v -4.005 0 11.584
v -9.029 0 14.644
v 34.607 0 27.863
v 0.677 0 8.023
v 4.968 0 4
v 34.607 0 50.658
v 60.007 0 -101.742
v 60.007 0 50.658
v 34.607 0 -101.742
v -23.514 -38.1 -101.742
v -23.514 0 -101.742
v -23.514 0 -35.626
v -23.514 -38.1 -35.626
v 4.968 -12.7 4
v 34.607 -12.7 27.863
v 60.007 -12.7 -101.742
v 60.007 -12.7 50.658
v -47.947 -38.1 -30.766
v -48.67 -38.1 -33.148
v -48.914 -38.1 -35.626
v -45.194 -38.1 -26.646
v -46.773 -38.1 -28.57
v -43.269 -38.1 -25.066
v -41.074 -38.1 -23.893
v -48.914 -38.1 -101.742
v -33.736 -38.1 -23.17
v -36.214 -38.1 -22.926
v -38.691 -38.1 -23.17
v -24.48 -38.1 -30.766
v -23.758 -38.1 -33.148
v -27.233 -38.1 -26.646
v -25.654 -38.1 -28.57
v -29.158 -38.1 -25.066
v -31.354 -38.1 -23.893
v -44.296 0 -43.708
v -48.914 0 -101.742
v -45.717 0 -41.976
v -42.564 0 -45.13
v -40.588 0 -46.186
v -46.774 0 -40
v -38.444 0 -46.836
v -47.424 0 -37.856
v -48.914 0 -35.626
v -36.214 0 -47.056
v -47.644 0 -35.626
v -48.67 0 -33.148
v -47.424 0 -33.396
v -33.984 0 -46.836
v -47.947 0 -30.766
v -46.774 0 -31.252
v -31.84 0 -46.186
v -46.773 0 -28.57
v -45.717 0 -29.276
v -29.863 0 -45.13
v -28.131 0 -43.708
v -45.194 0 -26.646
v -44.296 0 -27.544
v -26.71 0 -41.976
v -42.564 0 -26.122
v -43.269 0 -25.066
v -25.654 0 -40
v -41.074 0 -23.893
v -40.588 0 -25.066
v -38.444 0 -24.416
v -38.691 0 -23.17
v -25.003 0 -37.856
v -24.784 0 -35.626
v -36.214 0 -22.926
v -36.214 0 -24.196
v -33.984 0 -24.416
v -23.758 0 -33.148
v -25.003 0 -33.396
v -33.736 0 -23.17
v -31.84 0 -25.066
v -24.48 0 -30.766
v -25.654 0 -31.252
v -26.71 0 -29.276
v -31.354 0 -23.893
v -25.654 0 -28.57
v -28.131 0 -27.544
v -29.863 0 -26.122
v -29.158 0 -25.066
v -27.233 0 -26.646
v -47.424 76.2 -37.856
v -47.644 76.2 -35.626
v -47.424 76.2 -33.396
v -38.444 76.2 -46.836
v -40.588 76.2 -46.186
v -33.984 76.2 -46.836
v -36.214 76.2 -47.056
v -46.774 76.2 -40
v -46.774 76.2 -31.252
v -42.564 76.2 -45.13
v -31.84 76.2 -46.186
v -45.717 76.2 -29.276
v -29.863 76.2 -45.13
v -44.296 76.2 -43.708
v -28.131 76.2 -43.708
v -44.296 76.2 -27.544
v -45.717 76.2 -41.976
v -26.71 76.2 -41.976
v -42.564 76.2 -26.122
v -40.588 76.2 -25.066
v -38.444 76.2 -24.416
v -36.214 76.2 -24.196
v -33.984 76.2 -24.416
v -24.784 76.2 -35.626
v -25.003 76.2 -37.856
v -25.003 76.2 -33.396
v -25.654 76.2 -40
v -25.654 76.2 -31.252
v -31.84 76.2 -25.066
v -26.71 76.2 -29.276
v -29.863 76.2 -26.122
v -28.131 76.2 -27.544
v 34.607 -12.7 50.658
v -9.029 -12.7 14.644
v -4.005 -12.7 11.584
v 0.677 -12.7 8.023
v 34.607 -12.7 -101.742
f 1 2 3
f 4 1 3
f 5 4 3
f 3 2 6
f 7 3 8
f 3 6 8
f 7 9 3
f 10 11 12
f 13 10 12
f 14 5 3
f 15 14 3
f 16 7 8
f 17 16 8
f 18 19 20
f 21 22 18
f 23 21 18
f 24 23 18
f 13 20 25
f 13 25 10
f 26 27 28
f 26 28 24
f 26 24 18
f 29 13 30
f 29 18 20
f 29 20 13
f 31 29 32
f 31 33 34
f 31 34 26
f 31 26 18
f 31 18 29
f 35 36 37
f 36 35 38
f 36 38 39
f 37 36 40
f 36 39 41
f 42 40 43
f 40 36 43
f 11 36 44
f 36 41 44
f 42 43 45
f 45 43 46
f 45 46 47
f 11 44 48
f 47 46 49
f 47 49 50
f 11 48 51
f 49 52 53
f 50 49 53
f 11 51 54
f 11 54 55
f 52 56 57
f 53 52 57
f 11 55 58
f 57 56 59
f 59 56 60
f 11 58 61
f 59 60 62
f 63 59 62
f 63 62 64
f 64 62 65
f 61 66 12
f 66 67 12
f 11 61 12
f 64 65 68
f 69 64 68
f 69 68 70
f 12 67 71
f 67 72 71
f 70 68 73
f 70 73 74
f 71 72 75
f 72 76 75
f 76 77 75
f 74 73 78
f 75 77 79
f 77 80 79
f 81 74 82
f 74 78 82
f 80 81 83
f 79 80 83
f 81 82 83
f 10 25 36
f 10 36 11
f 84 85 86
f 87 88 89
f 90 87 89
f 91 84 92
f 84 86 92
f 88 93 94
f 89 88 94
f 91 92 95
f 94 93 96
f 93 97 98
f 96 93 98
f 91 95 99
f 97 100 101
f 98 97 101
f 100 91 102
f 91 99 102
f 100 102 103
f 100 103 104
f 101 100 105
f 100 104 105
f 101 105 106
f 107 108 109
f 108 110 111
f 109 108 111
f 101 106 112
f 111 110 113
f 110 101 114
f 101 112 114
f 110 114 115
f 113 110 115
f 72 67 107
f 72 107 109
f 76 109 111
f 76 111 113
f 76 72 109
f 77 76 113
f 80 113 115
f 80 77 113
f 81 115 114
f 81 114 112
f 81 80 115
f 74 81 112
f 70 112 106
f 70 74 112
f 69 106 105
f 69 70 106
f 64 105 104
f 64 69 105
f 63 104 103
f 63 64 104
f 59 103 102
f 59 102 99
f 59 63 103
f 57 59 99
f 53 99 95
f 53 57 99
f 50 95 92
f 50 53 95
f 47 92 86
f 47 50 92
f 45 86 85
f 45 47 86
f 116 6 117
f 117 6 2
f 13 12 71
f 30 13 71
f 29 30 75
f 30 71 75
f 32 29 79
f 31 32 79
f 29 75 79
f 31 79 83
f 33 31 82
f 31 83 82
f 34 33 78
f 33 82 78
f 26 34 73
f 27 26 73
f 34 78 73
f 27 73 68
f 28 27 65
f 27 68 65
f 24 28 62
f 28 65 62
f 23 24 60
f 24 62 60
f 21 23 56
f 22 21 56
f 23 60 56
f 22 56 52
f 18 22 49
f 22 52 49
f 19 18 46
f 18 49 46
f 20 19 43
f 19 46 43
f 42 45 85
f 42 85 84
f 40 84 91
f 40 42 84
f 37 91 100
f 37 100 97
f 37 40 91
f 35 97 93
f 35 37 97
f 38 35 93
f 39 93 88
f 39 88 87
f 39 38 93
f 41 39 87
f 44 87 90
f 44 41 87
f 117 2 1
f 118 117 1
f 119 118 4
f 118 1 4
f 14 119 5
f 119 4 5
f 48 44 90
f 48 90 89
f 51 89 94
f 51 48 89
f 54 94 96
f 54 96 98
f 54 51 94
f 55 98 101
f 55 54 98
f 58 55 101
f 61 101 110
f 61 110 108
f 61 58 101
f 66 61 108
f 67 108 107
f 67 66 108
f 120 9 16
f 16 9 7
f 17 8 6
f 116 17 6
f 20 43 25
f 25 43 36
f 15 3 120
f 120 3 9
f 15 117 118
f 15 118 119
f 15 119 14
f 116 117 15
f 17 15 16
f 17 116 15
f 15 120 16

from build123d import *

# Parameters (mm, degrees)
F1_DEPTH      = 12.7
F1_FACE_R     = 11.43
F2_DEPTH      = 25.4
F3_DEPTH      = 38.1
F3_DEPTH_BACK = 76.2


with BuildPart() as f1:
    # F0 (on Front) → F1 (new body)
    with BuildSketch(Plane.XZ):
        with BuildLine():
            Line((-36.2136464912, -101.742199043), (-23.5136464912, -101.742199043))
            Line((-23.5136464912, -101.742199043), (-23.5136464912, -84.8128875398))
            ThreePointArc((-23.5136464912, -84.8128875398), (-29.8126284331, -86.0211076134), (-36.2136464912, -86.425999043))
            Line((-36.2136464912, -86.425999043), (-36.2136464912, -101.742199043))
        make_face()
        with BuildLine():
            Line((-48.9136464912, -101.742199043), (-36.2136464912, -101.742199043))
            Line((-36.2136464912, -101.742199043), (-36.2136464912, -86.425999043))
            ThreePointArc((-36.2136464912, -86.425999043), (-42.6146645493, -86.0211076134), (-48.9136464912, -84.8128875398))
            Line((-48.9136464912, -84.8128875398), (-48.9136464912, -101.742199043))
        make_face()
        with BuildLine():
            ThreePointArc((-36.2136464912, -86.425999043), (-29.8126284331, -86.0211076134), (-23.5136464912, -84.8128875398))
            Line((-23.5136464912, -84.8128875398), (-23.5136464912, -35.625999043))
            ThreePointArc((-23.5136464912, -35.625999043), (-27.2333903701, -44.606255164), (-36.2136464912, -48.325999043))
            Line((-36.2136464912, -48.325999043), (-36.2136464912, -86.425999043))
        make_face()
        with BuildLine():
            ThreePointArc((-48.9136464912, -84.8128875398), (-42.6146645493, -86.0211076134), (-36.2136464912, -86.425999043))
            Line((-36.2136464912, -86.425999043), (-36.2136464912, -48.325999043))
            ThreePointArc((-36.2136464912, -48.325999043), (-45.1939026123, -44.606255164), (-48.9136464912, -35.625999043))
            Line((-48.9136464912, -35.625999043), (-48.9136464912, -84.8128875398))
        make_face()
        with BuildLine():
            Line((-24.7836464912, -35.625999043), (-23.5136464912, -35.625999043))
            ThreePointArc((-23.5136464912, -35.625999043), (-36.2136464912, -22.925999043), (-48.9136464912, -35.625999043))
            Line((-48.9136464912, -35.625999043), (-47.6436464912, -35.625999043))
            ThreePointArc((-47.6436464912, -35.625999043), (-36.2136464912, -24.195999043), (-24.7836464912, -35.625999043))
        make_face()
        with BuildLine():
            ThreePointArc((-36.2136464912, -48.325999043), (-27.2333903701, -44.606255164), (-23.5136464912, -35.625999043))
            Line((-23.5136464912, -35.625999043), (-24.7836464912, -35.625999043))
            ThreePointArc((-24.7836464912, -35.625999043), (-28.1314159822, -43.7082295519), (-36.2136464912, -47.055999043))
            Line((-36.2136464912, -47.055999043), (-36.2136464912, -48.325999043))
        make_face()
        with BuildLine():
            ThreePointArc((-48.9136464912, -35.625999043), (-45.1939026123, -44.606255164), (-36.2136464912, -48.325999043))
            Line((-36.2136464912, -48.325999043), (-36.2136464912, -47.055999043))
            ThreePointArc((-36.2136464912, -47.055999043), (-44.2958770002, -43.7082295519), (-47.6436464912, -35.625999043))
            Line((-47.6436464912, -35.625999043), (-48.9136464912, -35.625999043))
        make_face()
    extrude(amount=F1_DEPTH)

    # F0 (on Front) + F1_face (on face) → F2 (join)
    with BuildSketch(Plane.XZ):
        with BuildLine():
            Line((-48.9136464912, -101.742199043), (-36.2136464912, -101.742199043))
            Line((-36.2136464912, -101.742199043), (-36.2136464912, -86.425999043))
            ThreePointArc((-36.2136464912, -86.425999043), (-42.6146645493, -86.0211076134), (-48.9136464912, -84.8128875398))
            Line((-48.9136464912, -84.8128875398), (-48.9136464912, -101.742199043))
        make_face()
        with BuildLine():
            Line((-36.2136464912, -101.742199043), (-23.5136464912, -101.742199043))
            Line((-23.5136464912, -101.742199043), (-23.5136464912, -84.8128875398))
            ThreePointArc((-23.5136464912, -84.8128875398), (-29.8126284331, -86.0211076134), (-36.2136464912, -86.425999043))
            Line((-36.2136464912, -86.425999043), (-36.2136464912, -101.742199043))
        make_face()
        with BuildLine():
            ThreePointArc((-36.2136464912, -86.425999043), (-29.8126284331, -86.0211076134), (-23.5136464912, -84.8128875398))
            Line((-23.5136464912, -84.8128875398), (-23.5136464912, -35.625999043))
            ThreePointArc((-23.5136464912, -35.625999043), (-27.2333903701, -44.606255164), (-36.2136464912, -48.325999043))
            Line((-36.2136464912, -48.325999043), (-36.2136464912, -86.425999043))
        make_face()
        with BuildLine():
            ThreePointArc((-48.9136464912, -84.8128875398), (-42.6146645493, -86.0211076134), (-36.2136464912, -86.425999043))
            Line((-36.2136464912, -86.425999043), (-36.2136464912, -48.325999043))
            ThreePointArc((-36.2136464912, -48.325999043), (-45.1939026123, -44.606255164), (-48.9136464912, -35.625999043))
            Line((-48.9136464912, -35.625999043), (-48.9136464912, -84.8128875398))
        make_face()
        with BuildLine():
            ThreePointArc((-48.9136464912, -35.625999043), (-45.1939026123, -44.606255164), (-36.2136464912, -48.325999043))
            Line((-36.2136464912, -48.325999043), (-36.2136464912, -47.055999043))
            ThreePointArc((-36.2136464912, -47.055999043), (-44.2958770002, -43.7082295519), (-47.6436464912, -35.625999043))
            Line((-47.6436464912, -35.625999043), (-48.9136464912, -35.625999043))
        make_face()
        with BuildLine():
            ThreePointArc((-36.2136464912, -48.325999043), (-27.2333903701, -44.606255164), (-23.5136464912, -35.625999043))
            Line((-23.5136464912, -35.625999043), (-24.7836464912, -35.625999043))
            ThreePointArc((-24.7836464912, -35.625999043), (-28.1314159822, -43.7082295519), (-36.2136464912, -47.055999043))
            Line((-36.2136464912, -47.055999043), (-36.2136464912, -48.325999043))
        make_face()
    with BuildSketch(Plane(origin=(-36.2136464912, -12.7, -71.1982060797), x_dir=(1, 0, 0), z_dir=(0, -1, 0))):
        with BuildLine():
            ThreePointArc((12.7, 35.5722070367), (0, 48.2722070367), (-12.7, 35.5722070367))
            Line((-12.7, 35.5722070367), (-12.7, -30.5439929633))
            Line((-12.7, -30.5439929633), (12.7, -30.5439929633))
            Line((12.7, -30.5439929633), (12.7, 35.5722070367))
        make_face()
        with Locations((0, 35.5722070367)):
            Circle(F1_FACE_R, mode=Mode.SUBTRACT)
    extrude(amount=F2_DEPTH)

    # F0 (on Front) → F3 (join, two sides)
    with BuildSketch(Plane.XZ) as f3_sk:
        with BuildLine():
            ThreePointArc((-36.2136464912, -47.055999043), (-28.1314159822, -43.7082295519), (-24.7836464912, -35.625999043))
            ThreePointArc((-24.7836464912, -35.625999043), (-36.2136464912, -24.195999043), (-47.6436464912, -35.625999043))
            ThreePointArc((-47.6436464912, -35.625999043), (-44.2958770002, -43.7082295519), (-36.2136464912, -47.055999043))
        make_face()
    extrude(amount=F3_DEPTH)
    extrude(f3_sk.sketch, amount=-F3_DEPTH_BACK)


with BuildPart() as f1b:
    # F0 (on Front) → F1, piece 2 (new body)
    with BuildSketch(Plane.XZ):
        with BuildLine():
            Line((34.6073068906, 50.657800957), (-9.0286382413, 14.6442488821))
            ThreePointArc((-9.0286382413, 14.6442488821), (-1.6185245989, 9.8635606522), (4.9678962719, 3.9997884653))
            Line((4.9678962719, 3.9997884653), (34.6073068906, 27.8632844451))
            Line((34.6073068906, 27.8632844451), (34.6073068906, 50.657800957))
        make_face()
        Polygon((60.0073068906, 50.657800957), (34.6073068906, 50.657800957), (34.6073068906, 27.8632844451), (34.6073068906, -101.742199043), (60.0073068906, -101.742199043), align=None)
    extrude(amount=F1_DEPTH)


solid = Compound([f1.part, f1b.part])
